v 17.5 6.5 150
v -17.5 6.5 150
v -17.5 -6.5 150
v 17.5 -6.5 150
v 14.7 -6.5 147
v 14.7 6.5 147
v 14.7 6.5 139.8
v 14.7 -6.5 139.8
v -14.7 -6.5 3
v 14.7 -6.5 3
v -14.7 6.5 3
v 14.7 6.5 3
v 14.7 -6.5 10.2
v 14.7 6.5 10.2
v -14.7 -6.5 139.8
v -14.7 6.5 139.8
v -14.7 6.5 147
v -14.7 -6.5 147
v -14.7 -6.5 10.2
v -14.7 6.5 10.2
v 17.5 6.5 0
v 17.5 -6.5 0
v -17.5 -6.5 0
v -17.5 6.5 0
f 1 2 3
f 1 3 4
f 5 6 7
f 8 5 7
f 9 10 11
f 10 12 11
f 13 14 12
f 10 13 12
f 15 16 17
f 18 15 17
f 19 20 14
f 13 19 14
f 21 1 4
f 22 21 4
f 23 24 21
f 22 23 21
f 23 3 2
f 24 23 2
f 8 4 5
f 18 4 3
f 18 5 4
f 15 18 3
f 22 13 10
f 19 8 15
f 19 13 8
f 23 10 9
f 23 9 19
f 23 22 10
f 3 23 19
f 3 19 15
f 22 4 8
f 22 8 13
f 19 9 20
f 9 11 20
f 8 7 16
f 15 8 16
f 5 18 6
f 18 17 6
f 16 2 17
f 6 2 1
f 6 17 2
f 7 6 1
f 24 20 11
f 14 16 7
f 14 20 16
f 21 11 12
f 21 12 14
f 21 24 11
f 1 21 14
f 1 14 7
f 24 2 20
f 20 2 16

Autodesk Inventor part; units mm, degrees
ref_plane "YZ Plane" through (0, 0, 0) normal (1, 0, 0) x (0, 1, 0)
ref_plane "XZ Plane" through (0, 0, 0) normal (0, 1, 0) x (-1, 0, 0)
ref_plane "XY Plane" through (0, 0, 0) normal (0, 0, 1) x (1, 0, 0)
sketch "Sketch1" plane through (0, 0, 0) normal (0, 0, 1) x (1, 0, 0)
  line L0 (-17.5, 6.5) -> (17.5, 6.5)
  line L1 (17.5, 6.5) -> (17.5, -6.5)
  line L2 (17.5, -6.5) -> (-17.5, -6.5)
  line L3 (-17.5, -6.5) -> (-17.5, 6.5)
  line L4 (-17.5, 6.5) -> (17.5, -6.5) construction
  line L5 (17.5, 6.5) -> (-17.5, -6.5) construction
  line L6 (-17.5, 6.5) -> (17.5, 6.5) construction
  point P0 (0, 0)
  dimension "d0" = 35
  dimension "d1" = 0
  dimension "d2" = 13
extrude "Extrusion1" add sketch "Sketch1" along normal blind 150
sketch "Sketch2" plane through (-17.5, 6.5, 0) normal (0, 1, 0) x (1, 0, 0)
  line L0 (2.8, -10.2) -> (32.2, -10.2)
  line L1 (32.2, -10.2) -> (32.2, -3)
  line L2 (32.2, -3) -> (2.8, -3)
  line L3 (2.8, -3) -> (2.8, -10.2)
  line L4 (2.8, -10.2) -> (32.2, -3) construction
  line L5 (32.2, -10.2) -> (2.8, -3) construction
  line L6 (2.8, -10.2) -> (32.2, -10.2) construction
  line L7 (2.8, -6.6) -> (0, -6.6)
  line L8 (0, 0) -> (0, -150) projected
  line L9 (35, 0) -> (35, -150) projected
  line L10 (35, -6.6) -> (32.2, -6.6)
  line L11 (35, 0) -> (0, 0) projected
  line L12 (2.8, -147) -> (32.2, -147)
  line L13 (32.2, -147) -> (32.2, -139.8)
  line L14 (32.2, -139.8) -> (2.8, -139.8)
  line L15 (2.8, -139.8) -> (2.8, -147)
  line L16 (2.8, -147) -> (32.2, -139.8) construction
  line L17 (32.2, -147) -> (2.8, -139.8) construction
  line L18 (2.8, -147) -> (32.2, -147) construction
  line L19 (2.8, -143.4) -> (0, -143.4)
  line L20 (35, -143.4) -> (32.2, -143.4)
  line L21 (35, -150) -> (0, -150) projected
  point P0 (17.5, 0)
  point P1 (17.5, -6.6)
  point P2 (17.5, -143.4)
  dimension "d6" = 29.4
  dimension "d8" = 7.2
  dimension "d9" = 3
  dimension "d12" = 29.4
  dimension "d13" = 0
  dimension "d14" = 7.2
  dimension "d15" = 3
extrude "Extrusion2" cut sketch "Sketch2" against normal through all contours L3 L2 L1 L0 | L15 L14 L13 L12
properties part number "Leg"
